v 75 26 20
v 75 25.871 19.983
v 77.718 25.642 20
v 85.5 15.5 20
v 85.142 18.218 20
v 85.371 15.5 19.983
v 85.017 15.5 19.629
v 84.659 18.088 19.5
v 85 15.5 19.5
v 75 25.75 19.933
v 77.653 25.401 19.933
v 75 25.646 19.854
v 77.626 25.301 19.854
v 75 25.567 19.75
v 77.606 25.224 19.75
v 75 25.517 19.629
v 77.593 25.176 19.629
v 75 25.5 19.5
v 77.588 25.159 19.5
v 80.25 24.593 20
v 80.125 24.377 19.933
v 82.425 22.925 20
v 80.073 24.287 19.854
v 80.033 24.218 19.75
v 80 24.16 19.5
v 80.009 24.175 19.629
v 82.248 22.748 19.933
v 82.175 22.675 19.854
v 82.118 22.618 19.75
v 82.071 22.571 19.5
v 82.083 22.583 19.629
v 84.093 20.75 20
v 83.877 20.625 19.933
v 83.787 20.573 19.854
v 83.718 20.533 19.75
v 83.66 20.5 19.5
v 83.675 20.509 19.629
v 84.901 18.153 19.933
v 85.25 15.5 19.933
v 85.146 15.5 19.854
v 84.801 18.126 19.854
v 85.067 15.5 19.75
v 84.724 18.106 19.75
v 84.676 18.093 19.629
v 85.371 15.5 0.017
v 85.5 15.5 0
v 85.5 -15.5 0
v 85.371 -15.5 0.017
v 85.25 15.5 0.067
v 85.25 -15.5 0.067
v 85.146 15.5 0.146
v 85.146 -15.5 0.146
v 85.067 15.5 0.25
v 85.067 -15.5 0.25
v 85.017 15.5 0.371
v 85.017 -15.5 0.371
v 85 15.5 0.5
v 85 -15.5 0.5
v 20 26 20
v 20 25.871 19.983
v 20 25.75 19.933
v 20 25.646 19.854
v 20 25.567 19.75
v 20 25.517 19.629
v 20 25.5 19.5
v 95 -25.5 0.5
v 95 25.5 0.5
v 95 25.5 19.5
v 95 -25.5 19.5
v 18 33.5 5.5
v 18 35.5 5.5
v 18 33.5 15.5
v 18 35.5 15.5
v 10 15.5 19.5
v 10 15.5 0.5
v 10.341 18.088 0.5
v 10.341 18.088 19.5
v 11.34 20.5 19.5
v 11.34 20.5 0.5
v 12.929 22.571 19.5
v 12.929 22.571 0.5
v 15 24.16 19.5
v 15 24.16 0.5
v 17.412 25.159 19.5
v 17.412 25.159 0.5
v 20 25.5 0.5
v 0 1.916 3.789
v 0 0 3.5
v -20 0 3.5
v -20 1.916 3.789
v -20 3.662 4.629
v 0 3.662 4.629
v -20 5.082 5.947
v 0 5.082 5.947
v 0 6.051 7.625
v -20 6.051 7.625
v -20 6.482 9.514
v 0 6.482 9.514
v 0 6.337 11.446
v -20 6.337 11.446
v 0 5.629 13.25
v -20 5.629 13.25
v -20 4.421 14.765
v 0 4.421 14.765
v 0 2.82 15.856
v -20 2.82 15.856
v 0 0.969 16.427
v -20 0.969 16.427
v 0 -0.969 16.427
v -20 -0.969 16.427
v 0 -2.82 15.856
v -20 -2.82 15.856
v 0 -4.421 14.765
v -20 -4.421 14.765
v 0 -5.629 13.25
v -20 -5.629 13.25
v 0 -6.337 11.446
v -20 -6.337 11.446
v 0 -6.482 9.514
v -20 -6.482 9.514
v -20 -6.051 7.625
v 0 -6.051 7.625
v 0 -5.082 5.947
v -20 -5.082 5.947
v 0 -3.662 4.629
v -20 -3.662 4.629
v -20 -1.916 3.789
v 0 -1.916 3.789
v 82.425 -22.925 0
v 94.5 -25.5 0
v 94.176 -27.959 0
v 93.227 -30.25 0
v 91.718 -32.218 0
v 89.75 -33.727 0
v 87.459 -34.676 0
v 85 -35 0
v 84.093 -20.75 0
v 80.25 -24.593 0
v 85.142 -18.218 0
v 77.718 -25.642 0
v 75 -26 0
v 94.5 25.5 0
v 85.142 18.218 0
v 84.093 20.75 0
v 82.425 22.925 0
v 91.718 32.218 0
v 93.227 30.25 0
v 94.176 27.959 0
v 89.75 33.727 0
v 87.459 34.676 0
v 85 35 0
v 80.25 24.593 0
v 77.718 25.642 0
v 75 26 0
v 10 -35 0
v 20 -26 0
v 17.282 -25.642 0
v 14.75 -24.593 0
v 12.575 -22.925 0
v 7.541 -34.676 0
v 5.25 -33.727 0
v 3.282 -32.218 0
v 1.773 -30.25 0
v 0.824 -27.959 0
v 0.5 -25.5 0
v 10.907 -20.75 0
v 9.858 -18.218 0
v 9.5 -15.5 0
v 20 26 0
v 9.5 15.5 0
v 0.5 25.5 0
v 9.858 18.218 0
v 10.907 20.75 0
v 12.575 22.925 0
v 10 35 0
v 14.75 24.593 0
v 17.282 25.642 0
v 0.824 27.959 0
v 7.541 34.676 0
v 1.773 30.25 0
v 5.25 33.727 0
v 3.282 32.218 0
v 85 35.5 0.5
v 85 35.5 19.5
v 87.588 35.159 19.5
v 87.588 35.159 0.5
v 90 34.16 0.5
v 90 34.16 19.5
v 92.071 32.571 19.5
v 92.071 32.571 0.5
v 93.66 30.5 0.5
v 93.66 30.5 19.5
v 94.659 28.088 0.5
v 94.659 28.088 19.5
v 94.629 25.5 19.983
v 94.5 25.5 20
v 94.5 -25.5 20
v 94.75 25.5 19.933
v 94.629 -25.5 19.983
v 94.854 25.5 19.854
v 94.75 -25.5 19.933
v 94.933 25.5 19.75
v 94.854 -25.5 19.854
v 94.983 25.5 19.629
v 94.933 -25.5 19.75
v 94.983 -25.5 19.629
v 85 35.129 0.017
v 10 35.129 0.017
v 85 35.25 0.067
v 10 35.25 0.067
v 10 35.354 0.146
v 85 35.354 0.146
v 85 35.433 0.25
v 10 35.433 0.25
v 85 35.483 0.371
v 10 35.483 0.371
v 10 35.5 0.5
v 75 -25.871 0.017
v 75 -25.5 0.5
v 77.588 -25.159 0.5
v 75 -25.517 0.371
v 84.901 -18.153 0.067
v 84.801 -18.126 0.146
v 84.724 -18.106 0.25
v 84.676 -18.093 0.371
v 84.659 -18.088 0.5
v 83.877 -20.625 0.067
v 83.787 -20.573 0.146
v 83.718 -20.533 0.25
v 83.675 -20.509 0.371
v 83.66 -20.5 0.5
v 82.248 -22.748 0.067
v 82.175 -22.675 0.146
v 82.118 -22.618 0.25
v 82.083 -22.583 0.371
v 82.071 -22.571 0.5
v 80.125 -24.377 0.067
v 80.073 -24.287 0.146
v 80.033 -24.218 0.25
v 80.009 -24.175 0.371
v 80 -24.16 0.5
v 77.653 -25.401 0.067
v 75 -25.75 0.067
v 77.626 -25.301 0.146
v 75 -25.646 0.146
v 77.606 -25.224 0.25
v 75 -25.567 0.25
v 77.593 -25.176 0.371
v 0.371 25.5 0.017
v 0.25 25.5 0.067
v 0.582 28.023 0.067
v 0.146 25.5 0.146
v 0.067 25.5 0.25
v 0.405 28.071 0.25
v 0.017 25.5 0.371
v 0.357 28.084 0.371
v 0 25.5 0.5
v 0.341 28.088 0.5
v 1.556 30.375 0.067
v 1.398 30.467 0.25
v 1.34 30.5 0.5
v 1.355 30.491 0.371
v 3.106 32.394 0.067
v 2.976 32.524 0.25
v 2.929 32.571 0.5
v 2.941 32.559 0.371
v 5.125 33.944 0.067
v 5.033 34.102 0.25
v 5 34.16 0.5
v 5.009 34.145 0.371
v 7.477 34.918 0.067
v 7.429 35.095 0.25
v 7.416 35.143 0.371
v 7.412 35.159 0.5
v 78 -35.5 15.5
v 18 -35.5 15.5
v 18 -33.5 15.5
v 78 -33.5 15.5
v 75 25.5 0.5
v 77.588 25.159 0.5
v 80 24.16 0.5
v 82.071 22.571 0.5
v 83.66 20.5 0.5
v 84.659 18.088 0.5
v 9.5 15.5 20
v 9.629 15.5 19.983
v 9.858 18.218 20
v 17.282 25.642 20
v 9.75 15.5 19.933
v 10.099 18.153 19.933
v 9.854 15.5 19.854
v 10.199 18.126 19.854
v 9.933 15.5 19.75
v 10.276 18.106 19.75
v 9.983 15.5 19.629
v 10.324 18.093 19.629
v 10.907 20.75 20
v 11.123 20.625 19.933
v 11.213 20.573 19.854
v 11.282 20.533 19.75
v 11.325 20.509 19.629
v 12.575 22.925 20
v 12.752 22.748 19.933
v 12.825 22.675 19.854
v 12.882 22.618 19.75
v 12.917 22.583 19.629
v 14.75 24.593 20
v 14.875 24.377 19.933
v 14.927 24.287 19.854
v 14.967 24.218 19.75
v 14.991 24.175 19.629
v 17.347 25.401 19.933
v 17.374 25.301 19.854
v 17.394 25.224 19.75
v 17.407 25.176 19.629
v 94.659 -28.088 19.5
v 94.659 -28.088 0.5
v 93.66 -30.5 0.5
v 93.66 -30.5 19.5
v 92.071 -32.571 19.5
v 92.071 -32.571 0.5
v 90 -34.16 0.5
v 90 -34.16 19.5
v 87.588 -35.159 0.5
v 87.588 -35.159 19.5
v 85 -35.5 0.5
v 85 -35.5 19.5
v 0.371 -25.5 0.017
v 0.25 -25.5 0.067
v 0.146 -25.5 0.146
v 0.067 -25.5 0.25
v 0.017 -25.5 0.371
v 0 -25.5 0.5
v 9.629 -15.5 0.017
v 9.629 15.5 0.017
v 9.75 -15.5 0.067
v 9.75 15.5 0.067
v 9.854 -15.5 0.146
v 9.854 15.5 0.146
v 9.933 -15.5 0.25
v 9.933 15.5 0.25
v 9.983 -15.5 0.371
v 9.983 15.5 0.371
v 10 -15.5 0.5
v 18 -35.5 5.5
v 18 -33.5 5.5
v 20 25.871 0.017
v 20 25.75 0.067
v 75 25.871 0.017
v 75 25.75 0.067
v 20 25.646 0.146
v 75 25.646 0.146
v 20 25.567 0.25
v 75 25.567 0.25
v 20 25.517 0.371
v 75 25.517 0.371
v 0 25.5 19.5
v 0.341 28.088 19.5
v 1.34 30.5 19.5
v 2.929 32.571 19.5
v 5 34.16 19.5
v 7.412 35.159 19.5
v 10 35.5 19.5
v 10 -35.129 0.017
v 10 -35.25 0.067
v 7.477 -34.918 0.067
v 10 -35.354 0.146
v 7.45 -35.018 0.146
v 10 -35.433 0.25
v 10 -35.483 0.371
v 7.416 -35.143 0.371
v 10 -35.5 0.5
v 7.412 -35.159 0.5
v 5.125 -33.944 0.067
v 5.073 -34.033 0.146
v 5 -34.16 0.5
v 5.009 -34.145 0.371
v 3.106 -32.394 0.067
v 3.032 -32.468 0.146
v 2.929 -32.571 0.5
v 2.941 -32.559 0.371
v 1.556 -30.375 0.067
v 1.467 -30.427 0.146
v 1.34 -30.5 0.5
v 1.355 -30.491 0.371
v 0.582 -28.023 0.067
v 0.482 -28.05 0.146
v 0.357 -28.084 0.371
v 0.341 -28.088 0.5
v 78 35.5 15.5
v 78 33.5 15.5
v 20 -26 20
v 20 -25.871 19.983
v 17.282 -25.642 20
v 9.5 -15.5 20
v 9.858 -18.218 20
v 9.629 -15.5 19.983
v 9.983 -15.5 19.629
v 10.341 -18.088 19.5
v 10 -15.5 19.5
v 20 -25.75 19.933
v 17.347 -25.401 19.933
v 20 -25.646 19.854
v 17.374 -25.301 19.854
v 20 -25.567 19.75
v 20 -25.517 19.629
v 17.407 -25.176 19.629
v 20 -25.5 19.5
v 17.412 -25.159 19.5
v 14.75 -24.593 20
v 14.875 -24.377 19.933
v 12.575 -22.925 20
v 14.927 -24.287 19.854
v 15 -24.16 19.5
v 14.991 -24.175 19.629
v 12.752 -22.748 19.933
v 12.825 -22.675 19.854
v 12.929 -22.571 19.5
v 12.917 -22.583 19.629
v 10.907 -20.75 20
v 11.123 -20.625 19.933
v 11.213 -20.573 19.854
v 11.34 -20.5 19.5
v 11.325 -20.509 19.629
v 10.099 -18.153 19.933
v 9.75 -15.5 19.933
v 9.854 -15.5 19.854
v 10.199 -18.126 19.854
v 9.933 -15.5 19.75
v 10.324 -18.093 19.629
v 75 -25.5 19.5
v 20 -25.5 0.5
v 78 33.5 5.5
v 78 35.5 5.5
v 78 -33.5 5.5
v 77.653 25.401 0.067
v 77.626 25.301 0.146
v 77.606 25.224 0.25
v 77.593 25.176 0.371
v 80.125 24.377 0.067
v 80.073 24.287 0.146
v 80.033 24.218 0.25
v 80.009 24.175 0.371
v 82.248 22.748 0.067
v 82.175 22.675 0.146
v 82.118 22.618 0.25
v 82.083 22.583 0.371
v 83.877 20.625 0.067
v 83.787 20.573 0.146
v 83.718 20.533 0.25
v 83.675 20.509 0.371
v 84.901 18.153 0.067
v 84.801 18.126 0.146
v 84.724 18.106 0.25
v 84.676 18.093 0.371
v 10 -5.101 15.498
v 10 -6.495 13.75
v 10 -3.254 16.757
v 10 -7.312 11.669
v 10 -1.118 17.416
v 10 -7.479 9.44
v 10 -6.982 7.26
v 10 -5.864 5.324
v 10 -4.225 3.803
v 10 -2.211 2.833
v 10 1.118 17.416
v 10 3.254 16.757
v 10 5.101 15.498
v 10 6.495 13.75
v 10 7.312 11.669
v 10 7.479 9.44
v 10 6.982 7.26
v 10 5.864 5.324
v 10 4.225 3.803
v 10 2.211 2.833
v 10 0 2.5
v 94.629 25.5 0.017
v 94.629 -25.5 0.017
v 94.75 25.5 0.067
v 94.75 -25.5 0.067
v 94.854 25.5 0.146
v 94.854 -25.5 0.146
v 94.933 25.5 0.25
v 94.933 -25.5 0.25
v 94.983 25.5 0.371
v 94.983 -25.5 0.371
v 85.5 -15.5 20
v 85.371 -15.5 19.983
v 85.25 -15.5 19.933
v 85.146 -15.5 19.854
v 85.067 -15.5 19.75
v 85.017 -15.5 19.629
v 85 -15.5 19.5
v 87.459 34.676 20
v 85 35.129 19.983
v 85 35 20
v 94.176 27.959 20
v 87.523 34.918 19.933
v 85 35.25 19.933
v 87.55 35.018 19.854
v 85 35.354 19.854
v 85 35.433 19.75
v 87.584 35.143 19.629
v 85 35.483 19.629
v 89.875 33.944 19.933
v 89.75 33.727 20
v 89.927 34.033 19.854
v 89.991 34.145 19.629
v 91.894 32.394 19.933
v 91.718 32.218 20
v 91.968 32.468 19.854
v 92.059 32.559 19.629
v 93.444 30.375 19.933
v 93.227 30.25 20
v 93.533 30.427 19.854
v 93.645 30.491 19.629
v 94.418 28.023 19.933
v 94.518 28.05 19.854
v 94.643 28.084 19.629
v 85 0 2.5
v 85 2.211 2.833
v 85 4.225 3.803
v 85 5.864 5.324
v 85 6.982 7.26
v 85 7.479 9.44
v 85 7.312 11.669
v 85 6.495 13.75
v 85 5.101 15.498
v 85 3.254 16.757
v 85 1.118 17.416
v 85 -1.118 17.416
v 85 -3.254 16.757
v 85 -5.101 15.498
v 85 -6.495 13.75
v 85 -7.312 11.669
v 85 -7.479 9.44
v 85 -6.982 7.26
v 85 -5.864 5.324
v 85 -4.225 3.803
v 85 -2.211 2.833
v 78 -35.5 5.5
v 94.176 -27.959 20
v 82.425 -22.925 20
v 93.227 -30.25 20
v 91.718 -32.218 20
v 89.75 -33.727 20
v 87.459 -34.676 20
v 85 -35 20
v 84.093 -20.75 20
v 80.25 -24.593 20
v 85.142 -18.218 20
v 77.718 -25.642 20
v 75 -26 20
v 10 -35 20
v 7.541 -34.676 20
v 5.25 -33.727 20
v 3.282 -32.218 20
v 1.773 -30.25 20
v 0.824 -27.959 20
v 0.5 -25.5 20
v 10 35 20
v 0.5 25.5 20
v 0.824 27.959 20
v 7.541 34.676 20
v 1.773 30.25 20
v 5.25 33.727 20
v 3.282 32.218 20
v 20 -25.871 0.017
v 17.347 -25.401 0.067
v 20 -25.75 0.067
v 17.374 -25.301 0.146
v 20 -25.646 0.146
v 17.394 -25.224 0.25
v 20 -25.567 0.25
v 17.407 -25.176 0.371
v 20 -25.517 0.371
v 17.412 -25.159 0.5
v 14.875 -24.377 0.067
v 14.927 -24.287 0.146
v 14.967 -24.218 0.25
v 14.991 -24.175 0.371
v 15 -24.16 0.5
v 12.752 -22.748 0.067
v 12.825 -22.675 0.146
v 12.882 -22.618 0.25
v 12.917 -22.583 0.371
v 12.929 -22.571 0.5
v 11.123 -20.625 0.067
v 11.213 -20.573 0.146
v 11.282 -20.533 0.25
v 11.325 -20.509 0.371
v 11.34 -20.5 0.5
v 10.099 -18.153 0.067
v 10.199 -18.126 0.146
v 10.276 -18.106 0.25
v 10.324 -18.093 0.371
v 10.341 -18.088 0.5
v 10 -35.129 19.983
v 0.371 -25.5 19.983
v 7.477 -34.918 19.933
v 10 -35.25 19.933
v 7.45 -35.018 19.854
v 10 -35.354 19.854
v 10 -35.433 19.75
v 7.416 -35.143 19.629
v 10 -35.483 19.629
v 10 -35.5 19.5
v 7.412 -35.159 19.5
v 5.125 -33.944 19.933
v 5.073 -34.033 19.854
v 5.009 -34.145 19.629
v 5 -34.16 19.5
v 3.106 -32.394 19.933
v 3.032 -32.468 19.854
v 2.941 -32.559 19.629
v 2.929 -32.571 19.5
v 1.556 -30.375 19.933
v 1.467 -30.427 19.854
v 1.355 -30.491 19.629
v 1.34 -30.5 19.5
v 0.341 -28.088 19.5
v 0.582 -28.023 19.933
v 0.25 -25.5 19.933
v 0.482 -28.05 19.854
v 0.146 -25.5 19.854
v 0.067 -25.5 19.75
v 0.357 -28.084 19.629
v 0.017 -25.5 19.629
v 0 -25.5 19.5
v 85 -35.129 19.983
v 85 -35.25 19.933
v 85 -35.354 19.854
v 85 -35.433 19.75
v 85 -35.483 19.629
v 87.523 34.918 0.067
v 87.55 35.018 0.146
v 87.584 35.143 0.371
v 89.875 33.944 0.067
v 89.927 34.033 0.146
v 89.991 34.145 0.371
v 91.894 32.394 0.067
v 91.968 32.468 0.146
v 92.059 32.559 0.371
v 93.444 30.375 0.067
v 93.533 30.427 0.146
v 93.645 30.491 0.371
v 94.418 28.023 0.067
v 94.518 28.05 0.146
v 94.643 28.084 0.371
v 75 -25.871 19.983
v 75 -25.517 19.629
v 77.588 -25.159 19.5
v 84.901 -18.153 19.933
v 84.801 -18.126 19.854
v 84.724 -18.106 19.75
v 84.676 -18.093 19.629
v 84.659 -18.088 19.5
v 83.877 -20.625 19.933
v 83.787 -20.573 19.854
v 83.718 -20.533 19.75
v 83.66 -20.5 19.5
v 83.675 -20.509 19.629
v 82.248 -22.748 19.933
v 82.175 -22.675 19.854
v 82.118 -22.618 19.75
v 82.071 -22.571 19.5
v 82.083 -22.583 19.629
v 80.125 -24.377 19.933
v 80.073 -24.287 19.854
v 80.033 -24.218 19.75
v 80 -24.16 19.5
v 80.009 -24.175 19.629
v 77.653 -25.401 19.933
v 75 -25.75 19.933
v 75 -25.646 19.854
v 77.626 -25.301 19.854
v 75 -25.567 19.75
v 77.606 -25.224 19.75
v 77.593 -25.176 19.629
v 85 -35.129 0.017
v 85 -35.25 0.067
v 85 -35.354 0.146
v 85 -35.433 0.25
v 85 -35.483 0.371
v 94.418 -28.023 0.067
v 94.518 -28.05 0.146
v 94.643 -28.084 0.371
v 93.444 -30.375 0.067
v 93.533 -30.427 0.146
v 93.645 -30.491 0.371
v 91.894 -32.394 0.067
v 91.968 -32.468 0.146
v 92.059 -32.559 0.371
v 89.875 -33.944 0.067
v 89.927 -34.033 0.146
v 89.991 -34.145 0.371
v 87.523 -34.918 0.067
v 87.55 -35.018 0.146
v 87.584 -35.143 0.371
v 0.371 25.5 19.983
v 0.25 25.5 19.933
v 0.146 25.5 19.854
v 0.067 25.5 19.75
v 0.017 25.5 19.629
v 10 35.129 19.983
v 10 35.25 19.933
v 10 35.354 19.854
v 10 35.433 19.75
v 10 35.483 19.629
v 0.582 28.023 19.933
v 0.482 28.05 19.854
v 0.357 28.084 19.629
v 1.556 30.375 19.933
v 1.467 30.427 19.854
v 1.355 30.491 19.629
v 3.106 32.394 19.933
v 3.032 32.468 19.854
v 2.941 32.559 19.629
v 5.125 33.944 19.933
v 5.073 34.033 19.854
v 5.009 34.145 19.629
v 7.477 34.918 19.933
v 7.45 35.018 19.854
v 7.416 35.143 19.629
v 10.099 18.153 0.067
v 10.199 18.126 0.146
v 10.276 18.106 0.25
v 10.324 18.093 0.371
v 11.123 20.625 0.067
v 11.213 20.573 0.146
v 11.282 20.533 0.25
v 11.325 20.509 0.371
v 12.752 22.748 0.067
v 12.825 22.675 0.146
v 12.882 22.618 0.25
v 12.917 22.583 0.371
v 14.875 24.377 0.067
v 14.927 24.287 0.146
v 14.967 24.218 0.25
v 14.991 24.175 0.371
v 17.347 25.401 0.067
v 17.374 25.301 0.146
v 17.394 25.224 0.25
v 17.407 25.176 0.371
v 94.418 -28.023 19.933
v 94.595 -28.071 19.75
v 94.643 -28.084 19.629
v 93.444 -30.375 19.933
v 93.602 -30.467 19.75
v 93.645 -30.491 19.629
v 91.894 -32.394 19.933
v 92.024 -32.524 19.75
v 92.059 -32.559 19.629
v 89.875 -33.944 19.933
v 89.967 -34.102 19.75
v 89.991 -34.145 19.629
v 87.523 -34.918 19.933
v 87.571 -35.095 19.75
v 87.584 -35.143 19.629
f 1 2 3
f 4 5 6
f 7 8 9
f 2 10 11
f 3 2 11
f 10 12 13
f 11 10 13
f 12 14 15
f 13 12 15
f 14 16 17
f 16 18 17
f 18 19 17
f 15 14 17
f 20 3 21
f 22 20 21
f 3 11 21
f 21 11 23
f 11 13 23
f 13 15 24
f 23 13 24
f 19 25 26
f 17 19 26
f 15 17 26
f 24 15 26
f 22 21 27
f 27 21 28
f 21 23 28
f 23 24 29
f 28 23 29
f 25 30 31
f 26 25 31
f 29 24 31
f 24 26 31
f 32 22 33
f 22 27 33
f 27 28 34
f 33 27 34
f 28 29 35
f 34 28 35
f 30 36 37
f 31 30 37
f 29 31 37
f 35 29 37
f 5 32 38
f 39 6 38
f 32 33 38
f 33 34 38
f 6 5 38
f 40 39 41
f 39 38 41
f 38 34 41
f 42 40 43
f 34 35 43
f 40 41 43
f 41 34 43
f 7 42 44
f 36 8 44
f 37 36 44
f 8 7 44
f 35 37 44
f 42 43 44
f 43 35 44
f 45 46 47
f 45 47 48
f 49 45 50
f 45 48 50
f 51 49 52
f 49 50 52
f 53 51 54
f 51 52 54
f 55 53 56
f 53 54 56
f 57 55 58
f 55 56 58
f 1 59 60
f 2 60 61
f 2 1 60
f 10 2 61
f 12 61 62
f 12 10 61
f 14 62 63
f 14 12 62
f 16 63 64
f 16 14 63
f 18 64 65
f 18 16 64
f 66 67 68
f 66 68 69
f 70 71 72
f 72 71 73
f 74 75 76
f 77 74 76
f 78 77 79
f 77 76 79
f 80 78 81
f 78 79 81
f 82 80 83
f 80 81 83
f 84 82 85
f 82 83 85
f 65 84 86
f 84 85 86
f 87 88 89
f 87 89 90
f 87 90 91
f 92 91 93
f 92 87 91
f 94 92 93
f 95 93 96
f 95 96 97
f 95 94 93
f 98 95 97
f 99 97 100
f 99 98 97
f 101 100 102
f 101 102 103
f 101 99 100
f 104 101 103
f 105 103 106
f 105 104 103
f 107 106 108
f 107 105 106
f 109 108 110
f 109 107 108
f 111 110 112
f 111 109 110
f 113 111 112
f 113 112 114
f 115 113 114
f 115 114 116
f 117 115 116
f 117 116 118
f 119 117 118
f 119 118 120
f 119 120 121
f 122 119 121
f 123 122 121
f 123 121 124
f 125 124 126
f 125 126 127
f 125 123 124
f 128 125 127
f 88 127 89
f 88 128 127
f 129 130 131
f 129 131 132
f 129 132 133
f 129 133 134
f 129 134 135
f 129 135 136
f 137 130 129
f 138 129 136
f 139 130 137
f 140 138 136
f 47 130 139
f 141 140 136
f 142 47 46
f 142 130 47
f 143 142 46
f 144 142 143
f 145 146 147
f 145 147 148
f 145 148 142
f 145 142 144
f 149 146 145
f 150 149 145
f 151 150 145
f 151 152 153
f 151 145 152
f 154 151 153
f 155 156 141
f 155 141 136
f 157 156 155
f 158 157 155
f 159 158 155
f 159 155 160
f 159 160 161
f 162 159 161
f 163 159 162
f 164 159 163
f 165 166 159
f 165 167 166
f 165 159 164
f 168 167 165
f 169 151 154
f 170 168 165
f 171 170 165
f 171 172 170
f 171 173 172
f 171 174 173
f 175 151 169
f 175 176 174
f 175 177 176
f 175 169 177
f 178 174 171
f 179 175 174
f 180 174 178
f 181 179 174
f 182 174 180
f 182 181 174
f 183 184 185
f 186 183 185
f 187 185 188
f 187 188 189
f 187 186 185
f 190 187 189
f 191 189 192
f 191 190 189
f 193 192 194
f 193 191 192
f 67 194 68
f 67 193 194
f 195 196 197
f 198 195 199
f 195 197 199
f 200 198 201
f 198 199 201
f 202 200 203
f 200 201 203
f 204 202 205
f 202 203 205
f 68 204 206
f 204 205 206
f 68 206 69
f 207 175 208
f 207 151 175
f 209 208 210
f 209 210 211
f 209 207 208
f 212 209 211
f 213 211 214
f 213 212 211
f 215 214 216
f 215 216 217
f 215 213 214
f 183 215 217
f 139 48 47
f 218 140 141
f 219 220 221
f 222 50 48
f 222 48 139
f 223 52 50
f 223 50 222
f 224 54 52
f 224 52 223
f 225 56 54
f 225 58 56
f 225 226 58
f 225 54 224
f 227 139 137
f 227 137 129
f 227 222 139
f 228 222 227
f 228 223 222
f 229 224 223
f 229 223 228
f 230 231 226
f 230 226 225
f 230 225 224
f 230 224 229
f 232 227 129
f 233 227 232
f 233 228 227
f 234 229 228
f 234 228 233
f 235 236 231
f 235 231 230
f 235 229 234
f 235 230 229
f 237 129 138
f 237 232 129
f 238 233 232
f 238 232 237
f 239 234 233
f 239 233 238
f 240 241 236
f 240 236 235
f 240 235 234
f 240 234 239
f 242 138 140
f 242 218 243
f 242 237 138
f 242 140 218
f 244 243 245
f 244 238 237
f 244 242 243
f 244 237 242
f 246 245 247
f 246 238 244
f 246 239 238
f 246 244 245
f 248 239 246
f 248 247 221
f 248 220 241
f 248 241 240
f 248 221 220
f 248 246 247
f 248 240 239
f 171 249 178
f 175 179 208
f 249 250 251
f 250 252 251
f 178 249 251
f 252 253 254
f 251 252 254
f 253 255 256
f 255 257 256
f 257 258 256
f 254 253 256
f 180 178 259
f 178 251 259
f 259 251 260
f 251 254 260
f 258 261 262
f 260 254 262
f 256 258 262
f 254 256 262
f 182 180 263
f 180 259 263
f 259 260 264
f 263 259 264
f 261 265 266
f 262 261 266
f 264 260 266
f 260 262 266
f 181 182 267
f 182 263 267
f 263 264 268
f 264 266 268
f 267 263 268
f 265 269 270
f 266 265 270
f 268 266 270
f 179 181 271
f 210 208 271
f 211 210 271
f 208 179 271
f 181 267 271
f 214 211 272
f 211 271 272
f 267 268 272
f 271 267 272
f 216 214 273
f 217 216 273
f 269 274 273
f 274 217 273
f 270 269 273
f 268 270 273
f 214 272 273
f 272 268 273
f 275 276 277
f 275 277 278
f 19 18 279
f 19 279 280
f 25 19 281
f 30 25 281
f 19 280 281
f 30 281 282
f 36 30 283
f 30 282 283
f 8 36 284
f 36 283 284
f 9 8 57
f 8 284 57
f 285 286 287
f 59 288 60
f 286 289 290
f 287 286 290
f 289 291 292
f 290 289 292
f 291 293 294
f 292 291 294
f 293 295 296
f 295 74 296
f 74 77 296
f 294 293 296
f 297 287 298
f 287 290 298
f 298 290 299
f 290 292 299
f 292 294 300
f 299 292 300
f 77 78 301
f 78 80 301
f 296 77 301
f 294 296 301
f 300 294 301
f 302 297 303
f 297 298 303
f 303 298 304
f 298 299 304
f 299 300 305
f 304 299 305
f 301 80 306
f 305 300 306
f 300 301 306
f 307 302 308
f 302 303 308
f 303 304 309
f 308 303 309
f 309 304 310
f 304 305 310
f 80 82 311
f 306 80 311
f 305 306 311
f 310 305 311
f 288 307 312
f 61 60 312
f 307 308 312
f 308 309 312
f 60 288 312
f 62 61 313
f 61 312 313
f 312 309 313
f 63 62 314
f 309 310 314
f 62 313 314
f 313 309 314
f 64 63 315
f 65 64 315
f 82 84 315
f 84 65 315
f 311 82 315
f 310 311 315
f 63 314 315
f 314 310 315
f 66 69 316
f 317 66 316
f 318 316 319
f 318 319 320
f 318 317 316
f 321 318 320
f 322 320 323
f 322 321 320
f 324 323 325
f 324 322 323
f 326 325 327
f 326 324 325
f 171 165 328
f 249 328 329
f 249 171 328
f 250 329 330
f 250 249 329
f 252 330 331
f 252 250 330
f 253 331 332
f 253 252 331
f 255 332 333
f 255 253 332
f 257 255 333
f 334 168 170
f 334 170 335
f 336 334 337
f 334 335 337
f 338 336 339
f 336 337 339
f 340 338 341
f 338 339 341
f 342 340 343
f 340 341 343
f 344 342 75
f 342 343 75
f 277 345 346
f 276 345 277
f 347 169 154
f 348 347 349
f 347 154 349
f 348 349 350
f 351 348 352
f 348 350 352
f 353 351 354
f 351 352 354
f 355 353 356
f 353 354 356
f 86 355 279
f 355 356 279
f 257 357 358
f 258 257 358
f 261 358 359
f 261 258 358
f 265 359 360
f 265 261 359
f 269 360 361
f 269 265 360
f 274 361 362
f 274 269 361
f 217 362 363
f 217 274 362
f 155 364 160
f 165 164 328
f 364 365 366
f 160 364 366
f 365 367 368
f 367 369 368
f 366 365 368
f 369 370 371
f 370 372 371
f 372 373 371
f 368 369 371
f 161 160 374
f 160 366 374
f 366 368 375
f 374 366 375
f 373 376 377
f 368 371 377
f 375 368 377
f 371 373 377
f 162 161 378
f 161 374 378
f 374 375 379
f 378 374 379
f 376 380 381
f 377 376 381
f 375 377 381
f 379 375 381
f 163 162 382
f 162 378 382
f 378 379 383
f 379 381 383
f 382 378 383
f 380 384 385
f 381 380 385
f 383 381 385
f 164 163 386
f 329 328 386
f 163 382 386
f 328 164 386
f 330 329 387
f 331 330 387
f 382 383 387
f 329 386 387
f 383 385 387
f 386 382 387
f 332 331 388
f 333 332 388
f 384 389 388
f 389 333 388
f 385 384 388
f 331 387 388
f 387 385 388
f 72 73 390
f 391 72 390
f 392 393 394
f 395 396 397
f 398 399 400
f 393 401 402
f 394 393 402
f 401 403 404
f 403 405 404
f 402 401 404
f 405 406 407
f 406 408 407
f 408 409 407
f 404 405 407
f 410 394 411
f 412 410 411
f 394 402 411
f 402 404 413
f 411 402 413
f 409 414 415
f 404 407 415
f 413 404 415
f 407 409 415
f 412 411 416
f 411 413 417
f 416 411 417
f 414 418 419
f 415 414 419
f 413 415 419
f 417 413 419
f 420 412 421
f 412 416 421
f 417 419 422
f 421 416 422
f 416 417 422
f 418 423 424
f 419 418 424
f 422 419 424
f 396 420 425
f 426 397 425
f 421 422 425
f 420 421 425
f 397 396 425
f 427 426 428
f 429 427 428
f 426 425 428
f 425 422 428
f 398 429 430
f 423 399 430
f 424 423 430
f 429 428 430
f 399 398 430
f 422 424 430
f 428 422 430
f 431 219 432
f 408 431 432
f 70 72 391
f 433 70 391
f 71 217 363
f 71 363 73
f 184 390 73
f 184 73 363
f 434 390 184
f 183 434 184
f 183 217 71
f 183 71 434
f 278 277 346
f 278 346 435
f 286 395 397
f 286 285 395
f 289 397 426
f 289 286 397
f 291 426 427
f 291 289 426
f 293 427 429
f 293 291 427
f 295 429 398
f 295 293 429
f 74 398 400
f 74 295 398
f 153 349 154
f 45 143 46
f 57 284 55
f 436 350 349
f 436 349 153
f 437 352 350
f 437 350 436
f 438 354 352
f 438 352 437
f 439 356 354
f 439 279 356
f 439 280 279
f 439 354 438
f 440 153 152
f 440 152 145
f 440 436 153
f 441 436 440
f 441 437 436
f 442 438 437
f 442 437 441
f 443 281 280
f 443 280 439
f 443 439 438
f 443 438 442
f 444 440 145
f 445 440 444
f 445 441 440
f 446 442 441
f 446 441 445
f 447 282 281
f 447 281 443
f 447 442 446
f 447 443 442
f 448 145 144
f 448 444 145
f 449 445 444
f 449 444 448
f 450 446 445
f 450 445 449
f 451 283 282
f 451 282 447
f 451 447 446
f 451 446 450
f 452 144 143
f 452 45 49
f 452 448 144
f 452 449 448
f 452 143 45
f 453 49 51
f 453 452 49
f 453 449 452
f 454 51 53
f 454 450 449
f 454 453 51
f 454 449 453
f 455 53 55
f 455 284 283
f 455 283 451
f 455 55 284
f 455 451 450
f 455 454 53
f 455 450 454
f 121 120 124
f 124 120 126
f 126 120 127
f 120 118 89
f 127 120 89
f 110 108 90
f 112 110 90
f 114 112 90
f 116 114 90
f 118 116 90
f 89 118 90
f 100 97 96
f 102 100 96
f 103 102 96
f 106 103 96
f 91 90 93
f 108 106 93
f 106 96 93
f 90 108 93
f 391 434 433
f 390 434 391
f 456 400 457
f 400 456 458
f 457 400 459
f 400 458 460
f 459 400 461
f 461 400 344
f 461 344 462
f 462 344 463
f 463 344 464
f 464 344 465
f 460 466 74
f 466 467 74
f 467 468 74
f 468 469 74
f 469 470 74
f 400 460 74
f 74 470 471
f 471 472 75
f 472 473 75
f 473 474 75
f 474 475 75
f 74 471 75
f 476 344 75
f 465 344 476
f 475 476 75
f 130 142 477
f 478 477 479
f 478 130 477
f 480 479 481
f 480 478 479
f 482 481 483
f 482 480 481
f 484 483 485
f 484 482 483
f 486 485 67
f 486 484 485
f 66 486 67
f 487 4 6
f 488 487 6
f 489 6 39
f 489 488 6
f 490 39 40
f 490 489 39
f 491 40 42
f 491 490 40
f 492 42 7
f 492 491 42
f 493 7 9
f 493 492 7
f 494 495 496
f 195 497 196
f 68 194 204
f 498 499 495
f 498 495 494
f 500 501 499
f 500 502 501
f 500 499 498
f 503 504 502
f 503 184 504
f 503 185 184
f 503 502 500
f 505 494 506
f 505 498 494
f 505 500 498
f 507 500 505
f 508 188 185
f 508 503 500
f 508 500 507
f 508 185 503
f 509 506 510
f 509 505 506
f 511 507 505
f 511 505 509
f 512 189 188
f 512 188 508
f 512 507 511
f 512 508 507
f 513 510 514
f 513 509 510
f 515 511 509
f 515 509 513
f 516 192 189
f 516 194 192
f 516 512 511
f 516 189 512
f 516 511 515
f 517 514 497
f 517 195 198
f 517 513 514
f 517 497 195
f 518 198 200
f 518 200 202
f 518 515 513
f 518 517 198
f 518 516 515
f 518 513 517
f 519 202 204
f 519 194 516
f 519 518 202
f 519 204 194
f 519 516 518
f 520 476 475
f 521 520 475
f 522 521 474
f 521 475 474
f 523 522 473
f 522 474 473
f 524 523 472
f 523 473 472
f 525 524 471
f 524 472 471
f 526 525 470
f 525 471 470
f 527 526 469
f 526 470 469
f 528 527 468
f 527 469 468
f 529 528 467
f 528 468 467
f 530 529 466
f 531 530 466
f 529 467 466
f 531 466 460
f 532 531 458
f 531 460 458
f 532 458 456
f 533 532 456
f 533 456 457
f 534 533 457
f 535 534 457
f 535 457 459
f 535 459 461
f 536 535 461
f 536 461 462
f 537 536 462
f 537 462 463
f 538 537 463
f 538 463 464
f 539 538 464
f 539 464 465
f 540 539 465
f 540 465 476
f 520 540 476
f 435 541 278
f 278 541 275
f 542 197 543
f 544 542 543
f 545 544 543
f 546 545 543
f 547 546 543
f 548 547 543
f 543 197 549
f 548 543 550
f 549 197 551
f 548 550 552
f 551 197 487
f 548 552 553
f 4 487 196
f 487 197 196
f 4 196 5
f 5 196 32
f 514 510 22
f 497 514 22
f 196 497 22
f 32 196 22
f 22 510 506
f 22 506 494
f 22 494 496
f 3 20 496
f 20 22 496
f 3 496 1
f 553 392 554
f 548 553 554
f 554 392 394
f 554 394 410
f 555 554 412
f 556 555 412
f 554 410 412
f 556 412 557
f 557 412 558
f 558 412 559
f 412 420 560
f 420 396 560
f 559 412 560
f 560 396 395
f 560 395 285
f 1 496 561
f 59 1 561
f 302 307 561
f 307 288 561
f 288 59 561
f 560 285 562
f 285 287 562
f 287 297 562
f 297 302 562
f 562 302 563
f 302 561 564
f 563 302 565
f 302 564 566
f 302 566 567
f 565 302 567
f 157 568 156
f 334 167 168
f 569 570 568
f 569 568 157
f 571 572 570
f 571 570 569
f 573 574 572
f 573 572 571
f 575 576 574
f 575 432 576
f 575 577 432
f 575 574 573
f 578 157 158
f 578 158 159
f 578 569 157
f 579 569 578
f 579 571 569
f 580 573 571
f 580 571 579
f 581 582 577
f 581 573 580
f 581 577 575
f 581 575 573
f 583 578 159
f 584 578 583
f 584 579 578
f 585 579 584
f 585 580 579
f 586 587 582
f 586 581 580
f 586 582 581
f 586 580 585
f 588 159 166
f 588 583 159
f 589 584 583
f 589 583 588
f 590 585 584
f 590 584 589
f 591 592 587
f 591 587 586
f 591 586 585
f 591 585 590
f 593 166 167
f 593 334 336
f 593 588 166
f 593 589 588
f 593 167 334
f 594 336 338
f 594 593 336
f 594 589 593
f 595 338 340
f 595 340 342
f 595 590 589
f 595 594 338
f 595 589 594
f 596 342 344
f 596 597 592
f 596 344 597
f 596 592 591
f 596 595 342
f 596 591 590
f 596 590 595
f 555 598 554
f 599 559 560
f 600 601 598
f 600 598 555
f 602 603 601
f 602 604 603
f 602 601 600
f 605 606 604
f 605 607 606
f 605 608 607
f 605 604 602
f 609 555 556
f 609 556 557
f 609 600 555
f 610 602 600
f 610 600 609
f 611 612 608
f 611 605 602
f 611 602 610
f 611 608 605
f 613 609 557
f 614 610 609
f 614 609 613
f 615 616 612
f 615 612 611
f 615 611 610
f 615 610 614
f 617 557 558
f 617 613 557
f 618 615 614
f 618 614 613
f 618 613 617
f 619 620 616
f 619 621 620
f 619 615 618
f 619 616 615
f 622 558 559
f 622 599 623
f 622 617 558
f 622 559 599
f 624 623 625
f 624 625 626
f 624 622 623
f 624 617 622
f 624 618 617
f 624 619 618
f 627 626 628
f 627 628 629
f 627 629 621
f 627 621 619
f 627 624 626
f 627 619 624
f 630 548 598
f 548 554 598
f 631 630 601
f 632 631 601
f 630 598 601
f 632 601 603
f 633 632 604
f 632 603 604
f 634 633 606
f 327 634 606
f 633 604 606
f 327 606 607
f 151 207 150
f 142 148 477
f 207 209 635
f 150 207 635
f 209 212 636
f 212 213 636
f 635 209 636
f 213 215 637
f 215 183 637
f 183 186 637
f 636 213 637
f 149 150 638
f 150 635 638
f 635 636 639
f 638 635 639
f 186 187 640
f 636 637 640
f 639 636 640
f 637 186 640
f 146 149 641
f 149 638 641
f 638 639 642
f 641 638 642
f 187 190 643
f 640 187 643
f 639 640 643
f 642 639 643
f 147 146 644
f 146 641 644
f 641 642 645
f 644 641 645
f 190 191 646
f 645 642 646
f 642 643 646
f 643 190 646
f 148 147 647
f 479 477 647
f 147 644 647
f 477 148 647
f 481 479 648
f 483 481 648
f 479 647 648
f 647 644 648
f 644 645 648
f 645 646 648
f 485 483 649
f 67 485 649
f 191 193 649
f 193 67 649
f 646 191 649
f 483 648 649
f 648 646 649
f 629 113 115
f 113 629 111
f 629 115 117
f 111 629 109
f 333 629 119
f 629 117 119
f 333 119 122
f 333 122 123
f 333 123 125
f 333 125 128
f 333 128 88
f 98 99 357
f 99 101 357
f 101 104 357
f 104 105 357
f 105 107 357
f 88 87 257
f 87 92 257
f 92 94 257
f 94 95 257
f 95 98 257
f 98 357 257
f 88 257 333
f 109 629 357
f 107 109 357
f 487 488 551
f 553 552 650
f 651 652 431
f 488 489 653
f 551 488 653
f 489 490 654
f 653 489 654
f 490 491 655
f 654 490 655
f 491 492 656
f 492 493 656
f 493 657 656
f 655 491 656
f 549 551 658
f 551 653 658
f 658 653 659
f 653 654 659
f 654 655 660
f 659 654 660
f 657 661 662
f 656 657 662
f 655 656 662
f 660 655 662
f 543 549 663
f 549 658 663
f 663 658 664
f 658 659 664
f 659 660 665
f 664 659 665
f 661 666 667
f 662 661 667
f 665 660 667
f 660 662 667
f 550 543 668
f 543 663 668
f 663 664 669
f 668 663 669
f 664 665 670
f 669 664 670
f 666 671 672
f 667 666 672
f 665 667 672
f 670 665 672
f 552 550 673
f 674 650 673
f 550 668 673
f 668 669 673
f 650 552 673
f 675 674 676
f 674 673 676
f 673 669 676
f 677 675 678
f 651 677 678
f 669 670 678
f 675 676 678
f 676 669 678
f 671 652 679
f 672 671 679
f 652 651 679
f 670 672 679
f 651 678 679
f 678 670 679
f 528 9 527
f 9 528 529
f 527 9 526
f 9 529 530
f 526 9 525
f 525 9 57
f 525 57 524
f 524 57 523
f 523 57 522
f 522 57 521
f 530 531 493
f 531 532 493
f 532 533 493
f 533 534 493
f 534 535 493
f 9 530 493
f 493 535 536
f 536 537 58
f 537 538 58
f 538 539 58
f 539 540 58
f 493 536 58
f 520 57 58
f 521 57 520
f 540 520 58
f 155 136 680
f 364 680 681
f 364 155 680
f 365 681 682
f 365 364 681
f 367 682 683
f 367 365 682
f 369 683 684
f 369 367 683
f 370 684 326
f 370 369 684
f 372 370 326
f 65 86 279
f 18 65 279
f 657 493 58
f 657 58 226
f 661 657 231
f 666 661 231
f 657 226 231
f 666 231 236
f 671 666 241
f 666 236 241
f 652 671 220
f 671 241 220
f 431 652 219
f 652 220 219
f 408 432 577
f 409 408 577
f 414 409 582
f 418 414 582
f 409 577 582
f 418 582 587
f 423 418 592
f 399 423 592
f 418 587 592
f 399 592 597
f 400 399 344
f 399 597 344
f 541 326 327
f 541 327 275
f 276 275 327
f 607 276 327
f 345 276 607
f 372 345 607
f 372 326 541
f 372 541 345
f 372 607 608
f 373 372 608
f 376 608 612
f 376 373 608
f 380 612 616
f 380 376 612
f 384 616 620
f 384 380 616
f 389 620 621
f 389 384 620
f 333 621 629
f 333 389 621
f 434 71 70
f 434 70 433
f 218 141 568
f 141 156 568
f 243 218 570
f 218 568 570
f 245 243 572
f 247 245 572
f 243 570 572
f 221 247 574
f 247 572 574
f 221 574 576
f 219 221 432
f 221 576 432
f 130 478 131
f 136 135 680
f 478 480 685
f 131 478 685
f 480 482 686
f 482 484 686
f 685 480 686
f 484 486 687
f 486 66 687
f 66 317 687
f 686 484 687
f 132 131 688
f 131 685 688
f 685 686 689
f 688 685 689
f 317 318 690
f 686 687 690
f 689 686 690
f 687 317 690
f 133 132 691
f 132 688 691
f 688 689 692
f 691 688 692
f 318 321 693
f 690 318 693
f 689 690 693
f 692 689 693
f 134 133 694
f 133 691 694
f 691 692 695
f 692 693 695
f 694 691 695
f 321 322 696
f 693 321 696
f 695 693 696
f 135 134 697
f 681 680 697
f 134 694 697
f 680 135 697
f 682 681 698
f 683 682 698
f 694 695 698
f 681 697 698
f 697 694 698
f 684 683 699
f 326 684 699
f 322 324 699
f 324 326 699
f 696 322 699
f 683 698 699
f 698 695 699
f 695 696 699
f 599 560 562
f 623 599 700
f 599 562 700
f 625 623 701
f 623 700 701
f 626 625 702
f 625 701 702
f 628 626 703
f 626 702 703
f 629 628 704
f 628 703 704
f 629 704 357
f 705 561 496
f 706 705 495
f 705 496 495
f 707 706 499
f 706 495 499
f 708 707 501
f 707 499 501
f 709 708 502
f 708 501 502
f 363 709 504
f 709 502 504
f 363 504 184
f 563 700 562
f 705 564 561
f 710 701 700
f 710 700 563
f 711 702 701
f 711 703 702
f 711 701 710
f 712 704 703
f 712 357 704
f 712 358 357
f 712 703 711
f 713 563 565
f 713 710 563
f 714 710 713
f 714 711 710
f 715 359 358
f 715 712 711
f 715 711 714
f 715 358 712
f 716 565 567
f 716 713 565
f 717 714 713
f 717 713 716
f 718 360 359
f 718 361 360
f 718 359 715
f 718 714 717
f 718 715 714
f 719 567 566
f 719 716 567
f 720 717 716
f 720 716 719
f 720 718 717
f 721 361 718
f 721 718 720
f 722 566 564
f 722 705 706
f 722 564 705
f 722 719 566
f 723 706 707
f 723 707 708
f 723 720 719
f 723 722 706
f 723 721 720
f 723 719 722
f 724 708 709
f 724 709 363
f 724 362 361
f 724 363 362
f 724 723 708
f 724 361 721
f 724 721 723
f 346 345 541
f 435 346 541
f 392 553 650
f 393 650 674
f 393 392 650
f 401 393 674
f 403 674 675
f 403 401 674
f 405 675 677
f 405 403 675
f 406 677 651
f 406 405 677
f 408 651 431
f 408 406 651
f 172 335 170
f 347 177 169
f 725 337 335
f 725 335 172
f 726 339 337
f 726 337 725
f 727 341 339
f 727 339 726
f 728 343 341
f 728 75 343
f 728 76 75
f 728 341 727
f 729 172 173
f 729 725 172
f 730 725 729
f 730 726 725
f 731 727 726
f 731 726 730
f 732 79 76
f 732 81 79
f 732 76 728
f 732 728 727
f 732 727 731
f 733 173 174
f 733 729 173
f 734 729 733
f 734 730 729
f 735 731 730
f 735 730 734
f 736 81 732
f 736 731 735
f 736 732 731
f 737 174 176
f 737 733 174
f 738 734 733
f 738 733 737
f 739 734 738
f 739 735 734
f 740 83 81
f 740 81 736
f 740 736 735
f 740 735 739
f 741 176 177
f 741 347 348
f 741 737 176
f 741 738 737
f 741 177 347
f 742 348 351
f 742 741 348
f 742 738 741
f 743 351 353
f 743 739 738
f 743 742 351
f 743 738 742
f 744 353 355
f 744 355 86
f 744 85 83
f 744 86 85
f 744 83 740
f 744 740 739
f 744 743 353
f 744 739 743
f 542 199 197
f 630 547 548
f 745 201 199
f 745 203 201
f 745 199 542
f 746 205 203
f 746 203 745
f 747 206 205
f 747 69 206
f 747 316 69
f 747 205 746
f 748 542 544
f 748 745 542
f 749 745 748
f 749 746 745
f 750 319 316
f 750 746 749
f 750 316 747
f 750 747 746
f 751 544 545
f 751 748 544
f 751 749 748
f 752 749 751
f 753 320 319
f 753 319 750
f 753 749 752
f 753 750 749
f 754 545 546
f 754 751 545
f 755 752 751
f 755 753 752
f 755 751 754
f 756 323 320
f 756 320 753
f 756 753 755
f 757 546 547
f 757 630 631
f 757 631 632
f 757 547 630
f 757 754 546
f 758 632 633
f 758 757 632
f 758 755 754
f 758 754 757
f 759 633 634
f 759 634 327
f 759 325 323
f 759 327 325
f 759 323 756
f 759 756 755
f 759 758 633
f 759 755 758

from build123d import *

# Parameters (mm, degrees)
BOSS_EXTRUDE1_DEPTH = 20
SKETCH2_R           = 7.5
BOSS_EXTRUDE2_DEPTH = 85
SKETCH4_R           = 6.5
BOSS_EXTRUDE3_DEPTH = 20
SKETCH5_W           = 60
SKETCH5_H           = 10
CUT_EXTRUDE1_DEPTH  = 2
FILLET1_R           = 0.5
FILLET2_R           = 0.5


with BuildPart() as part:
    # Sketch1 → Boss-Extrude1 (new body)
    with BuildSketch(Plane.XY):
        with BuildLine():
            Line((0, 0), (0, 25.5))
            ThreePointArc((0, 25.5), (2.928932188, 32.571067812), (10, 35.5))
            Line((10, 35.5), (85, 35.5))
            ThreePointArc((85, 35.5), (92.071067812, 32.571067812), (95, 25.5))
            Line((95, 25.5), (95, -25.5))
            ThreePointArc((95, -25.5), (92.071067812, -32.571067812), (85, -35.5))
            Line((85, -35.5), (10, -35.5))
            ThreePointArc((10, -35.5), (2.928932188, -32.571067812), (0, -25.5))
            Line((0, -25.5), (0, 0))
        make_face()
        with BuildLine():
            Line((10, 0), (10, 15.5))
            ThreePointArc((10, 15.5), (12.928932188, 22.571067812), (20, 25.5))
            Line((20, 25.5), (75, 25.5))
            ThreePointArc((75, 25.5), (82.071067812, 22.571067812), (85, 15.5))
            Line((85, 15.5), (85, 0))
            Line((85, 0), (85, -15.5))
            ThreePointArc((85, -15.5), (82.071067812, -22.571067812), (75, -25.5))
            Line((75, -25.5), (20, -25.5))
            ThreePointArc((20, -25.5), (12.928932188, -22.571067812), (10, -15.5))
            Line((10, -15.5), (10, 0))
        make_face(mode=Mode.SUBTRACT)
    extrude(amount=BOSS_EXTRUDE1_DEPTH)

    # Sketch2 → Boss-Extrude2 (add)
    with BuildSketch(Plane(origin=(0, 0, 0), x_dir=(0, 0, -1), z_dir=(1, 0, 0))):
        with Locations((-10, 0)):
            Circle(SKETCH2_R)
    extrude(amount=BOSS_EXTRUDE2_DEPTH)

    # Sketch4 → Boss-Extrude3 (add)
    with BuildSketch(Plane(origin=(0, 0, 0), x_dir=(0, 0, -1), z_dir=(1, 0, 0))):
        with Locations((-10, 0)):
            Circle(SKETCH4_R)
    extrude(amount=-BOSS_EXTRUDE3_DEPTH)

    # Sketch5 → Cut-Extrude1 (cut)
    with BuildSketch(Plane.XZ.offset(35.5)):
        with Locations((48, 10.5)):
            Rectangle(SKETCH5_W, SKETCH5_H)
    cut_extrude1 = extrude(amount=-CUT_EXTRUDE1_DEPTH, mode=Mode.SUBTRACT)

    # Mirror1: Cut-Extrude1 across plane
    add(cut_extrude1.mirror(Plane.ZX), mode=Mode.SUBTRACT)

    # Fillet1
    fillet1_edges = [part.edges().sort_by_distance(p)[0] for p in [
        (47.5, 35.5, 0),
        (92.071067812, 32.571067812, 0),
        (95, 0, 0),
        (92.071067812, -32.571067812, 0),
        (47.5, -35.5, 0),
        (2.928932188, -32.571067812, 0),
        (47.5, -35.5, 20),
        (92.071067812, -32.571067812, 20),
        (95, 0, 20),
        (92.071067812, 32.571067812, 20),
        (47.5, 35.5, 20),
        (2.928932188, 32.571067812, 20),
        (0, 0, 20),
        (2.928932188, -32.571067812, 20),
        (0, 0, 0),
        (2.928932188, 32.571067812, 0),
    ]]
    fillet(fillet1_edges, radius=FILLET1_R)

    # Fillet2
    fillet2_edges = [part.edges().sort_by_distance(p)[0] for p in [
        (12.928932188, -22.571067812, 0),
        (47.5, -25.5, 0),
        (82.071067812, -22.571067812, 0),
        (85, 0, 0),
        (82.071067812, 22.571067812, 0),
        (47.5, 25.5, 0),
        (12.928932188, 22.571067812, 0),
        (10, 0, 0),
        (10, 0, 20),
        (12.928932188, -22.571067812, 20),
        (47.5, -25.5, 20),
        (82.071067812, -22.571067812, 20),
        (85, 0, 20),
        (82.071067812, 22.571067812, 20),
        (47.5, 25.5, 20),
        (12.928932188, 22.571067812, 20),
    ]]
    fillet(fillet2_edges, radius=FILLET2_R)


solid = part.part
